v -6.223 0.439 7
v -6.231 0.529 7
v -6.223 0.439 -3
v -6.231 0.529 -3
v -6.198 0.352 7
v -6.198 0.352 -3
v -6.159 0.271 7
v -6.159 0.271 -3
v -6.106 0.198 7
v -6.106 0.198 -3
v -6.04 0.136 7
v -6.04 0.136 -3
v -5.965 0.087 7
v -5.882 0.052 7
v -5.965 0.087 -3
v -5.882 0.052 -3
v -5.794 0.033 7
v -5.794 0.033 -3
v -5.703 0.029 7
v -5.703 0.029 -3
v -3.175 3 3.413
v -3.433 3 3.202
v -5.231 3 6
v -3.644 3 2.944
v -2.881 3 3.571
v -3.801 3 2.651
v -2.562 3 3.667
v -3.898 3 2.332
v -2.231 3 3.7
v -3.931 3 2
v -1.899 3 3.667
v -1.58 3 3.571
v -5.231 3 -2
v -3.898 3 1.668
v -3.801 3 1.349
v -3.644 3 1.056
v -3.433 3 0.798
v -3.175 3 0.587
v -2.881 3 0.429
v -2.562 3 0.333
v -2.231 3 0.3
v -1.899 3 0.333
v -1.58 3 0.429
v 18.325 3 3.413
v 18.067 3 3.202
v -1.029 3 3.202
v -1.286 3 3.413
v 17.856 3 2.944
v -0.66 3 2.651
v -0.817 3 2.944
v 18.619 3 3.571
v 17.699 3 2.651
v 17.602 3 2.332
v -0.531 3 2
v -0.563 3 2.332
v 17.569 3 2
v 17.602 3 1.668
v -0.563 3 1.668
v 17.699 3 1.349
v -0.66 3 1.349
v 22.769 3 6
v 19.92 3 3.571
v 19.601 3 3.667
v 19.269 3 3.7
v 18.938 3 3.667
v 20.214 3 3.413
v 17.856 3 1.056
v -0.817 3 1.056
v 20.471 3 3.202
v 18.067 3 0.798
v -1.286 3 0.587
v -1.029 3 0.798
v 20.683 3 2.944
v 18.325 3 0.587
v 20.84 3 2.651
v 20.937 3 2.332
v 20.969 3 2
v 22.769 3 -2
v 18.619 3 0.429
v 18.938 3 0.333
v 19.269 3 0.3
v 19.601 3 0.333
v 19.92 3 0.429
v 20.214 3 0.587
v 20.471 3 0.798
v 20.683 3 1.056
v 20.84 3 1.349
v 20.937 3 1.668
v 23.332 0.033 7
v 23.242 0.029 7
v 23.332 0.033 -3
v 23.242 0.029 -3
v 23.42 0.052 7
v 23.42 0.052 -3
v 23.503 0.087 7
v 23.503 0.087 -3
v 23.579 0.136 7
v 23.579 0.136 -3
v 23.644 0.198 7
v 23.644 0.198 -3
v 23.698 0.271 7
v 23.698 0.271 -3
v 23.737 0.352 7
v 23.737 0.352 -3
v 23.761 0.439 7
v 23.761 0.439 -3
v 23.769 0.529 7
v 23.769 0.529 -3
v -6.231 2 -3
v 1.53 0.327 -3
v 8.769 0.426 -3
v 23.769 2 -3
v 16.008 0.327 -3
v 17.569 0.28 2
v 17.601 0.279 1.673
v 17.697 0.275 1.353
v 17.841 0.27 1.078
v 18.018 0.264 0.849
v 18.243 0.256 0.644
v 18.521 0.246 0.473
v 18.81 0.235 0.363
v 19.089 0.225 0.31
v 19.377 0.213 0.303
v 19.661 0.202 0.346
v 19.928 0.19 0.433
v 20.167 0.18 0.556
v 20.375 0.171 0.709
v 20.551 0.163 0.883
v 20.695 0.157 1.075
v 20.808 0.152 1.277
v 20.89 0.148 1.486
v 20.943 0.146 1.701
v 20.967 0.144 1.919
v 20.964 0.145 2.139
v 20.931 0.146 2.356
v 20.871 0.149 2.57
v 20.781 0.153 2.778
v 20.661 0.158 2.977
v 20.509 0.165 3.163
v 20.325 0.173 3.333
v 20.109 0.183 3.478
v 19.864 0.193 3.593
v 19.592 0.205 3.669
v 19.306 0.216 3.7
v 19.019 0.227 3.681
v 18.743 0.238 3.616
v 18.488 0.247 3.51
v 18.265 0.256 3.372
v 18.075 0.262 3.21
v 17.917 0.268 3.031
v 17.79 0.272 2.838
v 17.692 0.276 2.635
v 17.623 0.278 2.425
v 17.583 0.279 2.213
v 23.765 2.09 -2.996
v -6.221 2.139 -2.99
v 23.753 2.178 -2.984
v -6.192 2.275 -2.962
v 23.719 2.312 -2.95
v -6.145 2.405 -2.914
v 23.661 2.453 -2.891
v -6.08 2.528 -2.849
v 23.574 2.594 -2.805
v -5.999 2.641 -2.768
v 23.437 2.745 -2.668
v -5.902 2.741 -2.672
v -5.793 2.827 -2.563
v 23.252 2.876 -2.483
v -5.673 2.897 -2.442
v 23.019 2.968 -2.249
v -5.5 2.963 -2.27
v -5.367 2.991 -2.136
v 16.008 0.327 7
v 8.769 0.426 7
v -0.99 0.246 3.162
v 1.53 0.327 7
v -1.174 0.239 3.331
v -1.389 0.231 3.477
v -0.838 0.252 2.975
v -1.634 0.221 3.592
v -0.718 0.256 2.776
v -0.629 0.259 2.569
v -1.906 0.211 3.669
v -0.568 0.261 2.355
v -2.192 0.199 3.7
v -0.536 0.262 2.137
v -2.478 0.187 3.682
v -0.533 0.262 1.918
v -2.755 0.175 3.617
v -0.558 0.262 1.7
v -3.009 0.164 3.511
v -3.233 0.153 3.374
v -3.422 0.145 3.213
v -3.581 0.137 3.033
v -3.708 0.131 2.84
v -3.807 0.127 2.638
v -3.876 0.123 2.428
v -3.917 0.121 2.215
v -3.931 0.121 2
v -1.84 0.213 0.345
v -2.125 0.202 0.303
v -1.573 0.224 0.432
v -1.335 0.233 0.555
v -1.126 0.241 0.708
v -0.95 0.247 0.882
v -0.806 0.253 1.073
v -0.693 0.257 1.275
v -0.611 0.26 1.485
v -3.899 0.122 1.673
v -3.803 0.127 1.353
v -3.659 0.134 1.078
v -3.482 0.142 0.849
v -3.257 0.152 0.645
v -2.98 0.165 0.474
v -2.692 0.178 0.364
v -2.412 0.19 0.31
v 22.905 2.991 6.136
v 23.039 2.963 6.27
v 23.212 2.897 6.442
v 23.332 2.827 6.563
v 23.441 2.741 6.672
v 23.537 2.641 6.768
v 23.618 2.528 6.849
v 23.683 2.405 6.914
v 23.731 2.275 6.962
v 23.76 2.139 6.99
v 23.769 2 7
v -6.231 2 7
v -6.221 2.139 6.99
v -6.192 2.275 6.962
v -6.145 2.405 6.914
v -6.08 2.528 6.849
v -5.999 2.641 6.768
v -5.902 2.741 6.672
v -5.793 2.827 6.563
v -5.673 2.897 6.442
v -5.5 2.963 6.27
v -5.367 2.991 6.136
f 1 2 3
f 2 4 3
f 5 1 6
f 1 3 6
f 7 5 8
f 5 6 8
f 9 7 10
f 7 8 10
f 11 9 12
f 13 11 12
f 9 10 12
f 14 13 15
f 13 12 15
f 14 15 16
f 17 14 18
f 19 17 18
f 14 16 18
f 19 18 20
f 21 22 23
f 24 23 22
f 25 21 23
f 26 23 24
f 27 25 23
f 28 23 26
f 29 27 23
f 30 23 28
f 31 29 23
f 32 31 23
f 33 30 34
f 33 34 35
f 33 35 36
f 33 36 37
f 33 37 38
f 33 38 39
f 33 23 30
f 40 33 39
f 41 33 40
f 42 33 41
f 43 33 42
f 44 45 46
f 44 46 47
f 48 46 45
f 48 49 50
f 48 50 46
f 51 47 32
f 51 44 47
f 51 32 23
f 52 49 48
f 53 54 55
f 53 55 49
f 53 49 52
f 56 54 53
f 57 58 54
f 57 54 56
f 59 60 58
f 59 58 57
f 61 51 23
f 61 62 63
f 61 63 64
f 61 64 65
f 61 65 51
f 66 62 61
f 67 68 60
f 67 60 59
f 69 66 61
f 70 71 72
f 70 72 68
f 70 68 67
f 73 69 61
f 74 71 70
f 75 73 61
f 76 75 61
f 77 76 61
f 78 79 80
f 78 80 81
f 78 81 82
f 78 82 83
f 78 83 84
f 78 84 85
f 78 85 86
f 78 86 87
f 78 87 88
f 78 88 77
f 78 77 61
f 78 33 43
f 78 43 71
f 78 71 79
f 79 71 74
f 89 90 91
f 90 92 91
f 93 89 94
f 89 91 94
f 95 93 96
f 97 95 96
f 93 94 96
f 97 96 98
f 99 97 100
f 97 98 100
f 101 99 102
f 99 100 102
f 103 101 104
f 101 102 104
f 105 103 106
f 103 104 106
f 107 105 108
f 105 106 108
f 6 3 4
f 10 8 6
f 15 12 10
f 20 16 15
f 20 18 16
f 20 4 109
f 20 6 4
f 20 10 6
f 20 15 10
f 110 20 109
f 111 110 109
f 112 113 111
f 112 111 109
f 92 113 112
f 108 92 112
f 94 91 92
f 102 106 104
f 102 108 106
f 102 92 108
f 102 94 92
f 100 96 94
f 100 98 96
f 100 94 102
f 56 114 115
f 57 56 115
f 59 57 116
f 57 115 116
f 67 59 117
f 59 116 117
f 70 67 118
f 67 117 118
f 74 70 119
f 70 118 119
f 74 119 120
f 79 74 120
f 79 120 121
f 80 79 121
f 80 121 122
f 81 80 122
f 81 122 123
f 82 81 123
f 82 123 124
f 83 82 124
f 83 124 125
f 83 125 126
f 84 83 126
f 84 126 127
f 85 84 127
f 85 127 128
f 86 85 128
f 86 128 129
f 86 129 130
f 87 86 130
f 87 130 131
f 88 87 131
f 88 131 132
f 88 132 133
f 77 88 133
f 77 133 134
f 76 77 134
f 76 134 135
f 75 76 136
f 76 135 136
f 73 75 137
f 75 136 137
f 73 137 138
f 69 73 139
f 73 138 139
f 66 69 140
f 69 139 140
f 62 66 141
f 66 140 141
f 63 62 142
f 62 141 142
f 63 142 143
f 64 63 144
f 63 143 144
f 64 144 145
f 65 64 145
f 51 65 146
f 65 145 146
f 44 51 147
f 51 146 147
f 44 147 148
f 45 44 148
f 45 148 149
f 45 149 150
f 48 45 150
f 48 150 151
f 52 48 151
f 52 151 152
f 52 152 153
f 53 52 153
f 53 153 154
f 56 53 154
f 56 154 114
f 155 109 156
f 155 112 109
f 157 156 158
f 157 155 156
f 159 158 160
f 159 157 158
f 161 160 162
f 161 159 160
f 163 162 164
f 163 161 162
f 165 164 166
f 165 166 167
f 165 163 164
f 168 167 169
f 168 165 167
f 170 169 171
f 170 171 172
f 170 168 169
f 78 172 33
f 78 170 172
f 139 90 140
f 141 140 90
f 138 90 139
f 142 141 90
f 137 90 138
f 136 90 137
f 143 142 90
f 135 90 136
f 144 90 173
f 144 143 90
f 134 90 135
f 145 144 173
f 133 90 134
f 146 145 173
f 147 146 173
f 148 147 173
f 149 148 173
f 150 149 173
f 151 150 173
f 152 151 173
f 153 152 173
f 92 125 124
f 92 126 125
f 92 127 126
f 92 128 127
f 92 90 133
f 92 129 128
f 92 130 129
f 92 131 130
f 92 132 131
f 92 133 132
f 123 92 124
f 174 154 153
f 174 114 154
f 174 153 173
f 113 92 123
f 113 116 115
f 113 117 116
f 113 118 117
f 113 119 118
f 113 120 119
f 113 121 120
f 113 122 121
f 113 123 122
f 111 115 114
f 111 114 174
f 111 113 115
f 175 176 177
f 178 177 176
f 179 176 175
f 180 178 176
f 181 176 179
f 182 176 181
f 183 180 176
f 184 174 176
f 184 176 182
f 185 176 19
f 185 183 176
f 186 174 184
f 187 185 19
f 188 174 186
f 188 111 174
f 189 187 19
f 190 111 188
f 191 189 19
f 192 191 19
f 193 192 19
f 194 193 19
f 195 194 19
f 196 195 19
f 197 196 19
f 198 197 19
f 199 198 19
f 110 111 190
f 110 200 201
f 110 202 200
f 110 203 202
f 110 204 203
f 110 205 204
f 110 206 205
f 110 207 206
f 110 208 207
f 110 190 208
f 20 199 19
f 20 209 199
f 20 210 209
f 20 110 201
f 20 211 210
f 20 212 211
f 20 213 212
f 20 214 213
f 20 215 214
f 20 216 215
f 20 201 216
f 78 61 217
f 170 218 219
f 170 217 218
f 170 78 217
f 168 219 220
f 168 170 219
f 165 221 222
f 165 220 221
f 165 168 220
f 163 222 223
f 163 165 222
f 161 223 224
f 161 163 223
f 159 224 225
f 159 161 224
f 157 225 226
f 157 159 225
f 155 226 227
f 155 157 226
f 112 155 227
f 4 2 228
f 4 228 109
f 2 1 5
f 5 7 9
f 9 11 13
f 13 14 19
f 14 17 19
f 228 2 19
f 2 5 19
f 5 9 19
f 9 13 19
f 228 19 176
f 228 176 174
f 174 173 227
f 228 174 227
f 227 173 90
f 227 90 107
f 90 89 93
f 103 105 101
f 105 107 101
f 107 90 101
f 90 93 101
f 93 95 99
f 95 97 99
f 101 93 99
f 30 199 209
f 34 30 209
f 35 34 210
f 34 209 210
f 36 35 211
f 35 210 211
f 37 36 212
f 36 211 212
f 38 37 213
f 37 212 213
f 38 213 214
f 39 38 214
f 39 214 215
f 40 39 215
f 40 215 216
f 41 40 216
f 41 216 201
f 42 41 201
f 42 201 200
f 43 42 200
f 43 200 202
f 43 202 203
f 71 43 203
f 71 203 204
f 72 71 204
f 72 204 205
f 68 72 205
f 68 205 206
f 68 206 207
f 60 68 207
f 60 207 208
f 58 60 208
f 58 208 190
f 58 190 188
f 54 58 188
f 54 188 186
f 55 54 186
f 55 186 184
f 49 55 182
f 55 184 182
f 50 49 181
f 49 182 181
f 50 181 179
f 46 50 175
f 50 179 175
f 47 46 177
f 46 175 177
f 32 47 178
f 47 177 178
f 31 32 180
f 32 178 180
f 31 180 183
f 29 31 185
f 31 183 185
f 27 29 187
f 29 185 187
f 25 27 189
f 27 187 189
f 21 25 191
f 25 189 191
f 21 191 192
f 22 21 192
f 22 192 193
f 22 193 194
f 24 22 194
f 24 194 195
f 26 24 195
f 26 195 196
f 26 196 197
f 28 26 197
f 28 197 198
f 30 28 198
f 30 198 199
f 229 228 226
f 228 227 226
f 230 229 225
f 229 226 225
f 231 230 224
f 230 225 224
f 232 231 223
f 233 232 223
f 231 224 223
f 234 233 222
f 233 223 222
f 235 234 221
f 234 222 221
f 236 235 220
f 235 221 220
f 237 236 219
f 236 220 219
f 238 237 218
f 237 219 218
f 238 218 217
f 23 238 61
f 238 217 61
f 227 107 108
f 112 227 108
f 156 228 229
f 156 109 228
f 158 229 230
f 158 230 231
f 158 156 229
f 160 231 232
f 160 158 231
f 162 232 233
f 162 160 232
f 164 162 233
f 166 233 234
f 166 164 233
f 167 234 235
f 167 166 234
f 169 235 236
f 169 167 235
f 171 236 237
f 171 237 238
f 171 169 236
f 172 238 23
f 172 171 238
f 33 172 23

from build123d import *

# Parameters (mm, degrees)
SKETCH1_W            = 30
SKETCH1_H            = 10
BOSS_EXTRUDE1_DEPTH  = 3
M3_CLEARANCE_HOLE1_D = 3.4
FILLET3_R            = 1
CUT_EXTRUDE4_START   = -10
CUT_EXTRUDE4_DEPTH   = 10
FILLET4_R            = 0.5


# Read off the part's stored shape, not the designer's step: Cut-Extrude4
with BuildPart() as part:
    # Sketch1 → Boss-Extrude1 (new body)
    with BuildSketch(Plane(origin=(0, 0, 0), x_dir=(1, 0, 0), z_dir=(0, 1, 0))):
        with Locations((8.769230769, -2)):
            Rectangle(SKETCH1_W, SKETCH1_H)
    extrude(amount=BOSS_EXTRUDE1_DEPTH)

    # M3 Clearance Hole1 (through all)
    with Locations(Plane(origin=(0, 3, 0), x_dir=(1, 0, 0), z_dir=(0, 1, 0))):
        with Locations((-2.230769231, -2), (19.269230769, -2)):
            Hole(M3_CLEARANCE_HOLE1_D / 2)

    # Fillet3
    fillet3_edges = [part.edges().sort_by_distance(p)[0] for p in [
        (8.769230769, 3, 7),
        (23.769230769, 3, 2),
        (8.769230769, 3, -3),
        (-6.230769231, 3, 2),
    ]]
    fillet(fillet3_edges, radius=FILLET3_R)

    # Cut-Extrude4 outline → Cut-Extrude4 (cut)
    with BuildSketch(Plane.XY.offset(7).offset(CUT_EXTRUDE4_START)):
        with BuildLine():
            ThreePointArc((23.769230769, 0), (8.769230769, 0.426355955), (-6.230769231, 0))
            Line((-6.230769231, 0), (23.769230769, 0))
        make_face()
    extrude(amount=CUT_EXTRUDE4_DEPTH, mode=Mode.SUBTRACT)

    # Fillet4
    fillet4_edges = [part.edges().sort_by_distance(p)[0] for p in [
        (23.769230769, 0, 2),
        (-6.230769231, 0, 2),
    ]]
    fillet(fillet4_edges, radius=FILLET4_R)


solid = part.part
